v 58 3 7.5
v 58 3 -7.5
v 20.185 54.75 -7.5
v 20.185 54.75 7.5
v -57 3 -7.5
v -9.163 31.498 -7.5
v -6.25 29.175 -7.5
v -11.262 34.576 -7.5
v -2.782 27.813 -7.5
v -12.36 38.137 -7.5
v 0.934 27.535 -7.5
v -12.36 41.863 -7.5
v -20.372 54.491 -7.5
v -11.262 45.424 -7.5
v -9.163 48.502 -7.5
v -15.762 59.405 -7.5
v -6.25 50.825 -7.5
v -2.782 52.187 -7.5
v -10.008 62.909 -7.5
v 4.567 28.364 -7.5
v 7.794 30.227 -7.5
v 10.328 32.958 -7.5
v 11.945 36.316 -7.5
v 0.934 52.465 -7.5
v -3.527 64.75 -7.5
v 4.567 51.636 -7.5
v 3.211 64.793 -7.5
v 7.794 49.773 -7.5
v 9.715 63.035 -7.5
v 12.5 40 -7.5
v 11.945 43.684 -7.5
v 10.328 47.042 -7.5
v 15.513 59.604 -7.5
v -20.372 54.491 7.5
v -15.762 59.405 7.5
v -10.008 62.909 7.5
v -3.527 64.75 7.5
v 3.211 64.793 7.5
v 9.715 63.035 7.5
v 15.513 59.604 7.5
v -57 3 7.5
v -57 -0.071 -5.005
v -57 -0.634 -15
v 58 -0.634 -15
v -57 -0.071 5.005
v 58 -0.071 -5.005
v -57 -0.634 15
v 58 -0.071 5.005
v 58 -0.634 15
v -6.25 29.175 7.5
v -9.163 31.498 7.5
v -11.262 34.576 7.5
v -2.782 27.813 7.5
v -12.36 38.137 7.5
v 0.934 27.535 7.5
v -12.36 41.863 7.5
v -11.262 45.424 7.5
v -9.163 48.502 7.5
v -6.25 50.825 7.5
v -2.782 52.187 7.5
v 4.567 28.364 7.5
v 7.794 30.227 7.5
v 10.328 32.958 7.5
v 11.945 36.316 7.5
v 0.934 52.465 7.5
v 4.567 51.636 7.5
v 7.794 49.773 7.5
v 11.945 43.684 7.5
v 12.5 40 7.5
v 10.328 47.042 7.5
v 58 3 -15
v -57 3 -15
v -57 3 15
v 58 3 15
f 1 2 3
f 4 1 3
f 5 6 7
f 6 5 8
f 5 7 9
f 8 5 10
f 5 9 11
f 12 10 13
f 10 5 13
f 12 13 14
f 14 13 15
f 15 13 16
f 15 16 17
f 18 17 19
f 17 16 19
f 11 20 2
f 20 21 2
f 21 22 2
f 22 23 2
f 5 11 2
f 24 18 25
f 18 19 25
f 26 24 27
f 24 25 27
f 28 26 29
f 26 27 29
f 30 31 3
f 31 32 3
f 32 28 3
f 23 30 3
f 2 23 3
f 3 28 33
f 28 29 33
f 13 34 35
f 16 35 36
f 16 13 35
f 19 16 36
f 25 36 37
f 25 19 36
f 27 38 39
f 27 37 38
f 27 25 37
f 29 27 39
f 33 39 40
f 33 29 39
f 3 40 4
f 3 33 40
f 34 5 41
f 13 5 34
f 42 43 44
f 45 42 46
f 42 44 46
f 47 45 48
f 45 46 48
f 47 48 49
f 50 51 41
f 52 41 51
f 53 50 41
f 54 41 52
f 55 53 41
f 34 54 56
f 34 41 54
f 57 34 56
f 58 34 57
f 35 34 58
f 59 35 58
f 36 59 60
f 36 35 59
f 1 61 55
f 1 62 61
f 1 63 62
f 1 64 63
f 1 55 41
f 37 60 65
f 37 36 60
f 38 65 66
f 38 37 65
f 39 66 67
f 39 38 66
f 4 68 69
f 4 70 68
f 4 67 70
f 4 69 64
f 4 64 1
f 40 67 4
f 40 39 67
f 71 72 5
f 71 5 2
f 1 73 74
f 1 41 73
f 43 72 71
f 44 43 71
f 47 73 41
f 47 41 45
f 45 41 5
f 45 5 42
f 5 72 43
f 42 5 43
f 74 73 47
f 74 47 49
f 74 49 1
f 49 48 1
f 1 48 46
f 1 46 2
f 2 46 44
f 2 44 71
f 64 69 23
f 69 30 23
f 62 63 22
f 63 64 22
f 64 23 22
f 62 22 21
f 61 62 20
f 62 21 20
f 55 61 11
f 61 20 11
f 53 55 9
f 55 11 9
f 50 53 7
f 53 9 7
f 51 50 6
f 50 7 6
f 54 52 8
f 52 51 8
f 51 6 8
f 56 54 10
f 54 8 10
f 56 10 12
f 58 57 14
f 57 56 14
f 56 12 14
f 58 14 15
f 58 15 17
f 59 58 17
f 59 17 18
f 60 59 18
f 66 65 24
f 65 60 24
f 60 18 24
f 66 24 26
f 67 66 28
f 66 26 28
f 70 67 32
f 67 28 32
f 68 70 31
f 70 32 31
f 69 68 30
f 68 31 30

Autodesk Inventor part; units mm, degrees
ref_plane "YZ Plane" through (0, 0, 0) normal (1, 0, 0) x (0, 1, 0)
ref_plane "XZ Plane" through (0, 0, 0) normal (0, 1, 0) x (-1, 0, 0)
ref_plane "XY Plane" through (0, 0, 0) normal (0, 0, 1) x (1, 0, 0)
sketch "Sketch1" plane through (0, 0, 0) normal (0, 0, 1) x (1, 0, 0)
  line L0 (0, 0) -> (-57, 0)
  line L1 (0, 0) -> (58, 0)
  circle A0 centre (0, 40) radius 12.5
  arc A1 (20.1852, 54.7498) -> (-20.3716, 54.4913) centre (0, 40) ccw
  line L2 (-57, 0) -> (-57, 3)
  line L3 (-57, 3) -> (-20.3716, 54.4913)
  line L4 (58, 0) -> (58, 3)
  line L5 (58, 3) -> (20.1852, 54.7498)
  line L6 (-57, 3) -> (58, 3)
  point P0 (29, 0)
  dimension "d0" = 57
  dimension "d1" = 58
  dimension "d3" = 25
  dimension "d4" = 50
  dimension "d5" = 40
  dimension "d6" = 3
  dimension "d7" = 3
extrude "Extrusion1" add sketch "Sketch1" along normal mid plane 15 contours L3 A1 L5 L6
sketch "Sketch2" plane through (0, 0, 0) normal (0, 0, 1) x (1, 0, 0)
  line L0 (-57, 3) -> (58, 3) projected
  line L1 (-57, 3) -> (-57, 0)
  line L2 (-57, 0) -> (58, 0)
  line L3 (58, 0) -> (58, 3)
  point P0 (0, 0)
  point P1 (0.5, 0)
extrude "Extrusion2" add sketch "Sketch2" along normal mid plane 30
sketch "Sketch3" plane through (58, 0, 15) normal (1, 0, 0) x (0, 0, -1)
  arc A0 (30, -0.6339) -> (0, -0.6339) centre (15, -177.8) ccw
  line L0 (0, 0) -> (30, 0) projected
  line L1 (30, 0) -> (30, -0.6339)
  line L2 (0, 0) -> (0, -0.6339)
  point P0 (15, 0)
  point P1 (15, 0)
  dimension "d13" = 355.6
extrude "Extrusion3" add sketch "Sketch3" against normal up to surface (115 mm away)
properties part number "Lifting Lug" material "Steel ASTM A36"
